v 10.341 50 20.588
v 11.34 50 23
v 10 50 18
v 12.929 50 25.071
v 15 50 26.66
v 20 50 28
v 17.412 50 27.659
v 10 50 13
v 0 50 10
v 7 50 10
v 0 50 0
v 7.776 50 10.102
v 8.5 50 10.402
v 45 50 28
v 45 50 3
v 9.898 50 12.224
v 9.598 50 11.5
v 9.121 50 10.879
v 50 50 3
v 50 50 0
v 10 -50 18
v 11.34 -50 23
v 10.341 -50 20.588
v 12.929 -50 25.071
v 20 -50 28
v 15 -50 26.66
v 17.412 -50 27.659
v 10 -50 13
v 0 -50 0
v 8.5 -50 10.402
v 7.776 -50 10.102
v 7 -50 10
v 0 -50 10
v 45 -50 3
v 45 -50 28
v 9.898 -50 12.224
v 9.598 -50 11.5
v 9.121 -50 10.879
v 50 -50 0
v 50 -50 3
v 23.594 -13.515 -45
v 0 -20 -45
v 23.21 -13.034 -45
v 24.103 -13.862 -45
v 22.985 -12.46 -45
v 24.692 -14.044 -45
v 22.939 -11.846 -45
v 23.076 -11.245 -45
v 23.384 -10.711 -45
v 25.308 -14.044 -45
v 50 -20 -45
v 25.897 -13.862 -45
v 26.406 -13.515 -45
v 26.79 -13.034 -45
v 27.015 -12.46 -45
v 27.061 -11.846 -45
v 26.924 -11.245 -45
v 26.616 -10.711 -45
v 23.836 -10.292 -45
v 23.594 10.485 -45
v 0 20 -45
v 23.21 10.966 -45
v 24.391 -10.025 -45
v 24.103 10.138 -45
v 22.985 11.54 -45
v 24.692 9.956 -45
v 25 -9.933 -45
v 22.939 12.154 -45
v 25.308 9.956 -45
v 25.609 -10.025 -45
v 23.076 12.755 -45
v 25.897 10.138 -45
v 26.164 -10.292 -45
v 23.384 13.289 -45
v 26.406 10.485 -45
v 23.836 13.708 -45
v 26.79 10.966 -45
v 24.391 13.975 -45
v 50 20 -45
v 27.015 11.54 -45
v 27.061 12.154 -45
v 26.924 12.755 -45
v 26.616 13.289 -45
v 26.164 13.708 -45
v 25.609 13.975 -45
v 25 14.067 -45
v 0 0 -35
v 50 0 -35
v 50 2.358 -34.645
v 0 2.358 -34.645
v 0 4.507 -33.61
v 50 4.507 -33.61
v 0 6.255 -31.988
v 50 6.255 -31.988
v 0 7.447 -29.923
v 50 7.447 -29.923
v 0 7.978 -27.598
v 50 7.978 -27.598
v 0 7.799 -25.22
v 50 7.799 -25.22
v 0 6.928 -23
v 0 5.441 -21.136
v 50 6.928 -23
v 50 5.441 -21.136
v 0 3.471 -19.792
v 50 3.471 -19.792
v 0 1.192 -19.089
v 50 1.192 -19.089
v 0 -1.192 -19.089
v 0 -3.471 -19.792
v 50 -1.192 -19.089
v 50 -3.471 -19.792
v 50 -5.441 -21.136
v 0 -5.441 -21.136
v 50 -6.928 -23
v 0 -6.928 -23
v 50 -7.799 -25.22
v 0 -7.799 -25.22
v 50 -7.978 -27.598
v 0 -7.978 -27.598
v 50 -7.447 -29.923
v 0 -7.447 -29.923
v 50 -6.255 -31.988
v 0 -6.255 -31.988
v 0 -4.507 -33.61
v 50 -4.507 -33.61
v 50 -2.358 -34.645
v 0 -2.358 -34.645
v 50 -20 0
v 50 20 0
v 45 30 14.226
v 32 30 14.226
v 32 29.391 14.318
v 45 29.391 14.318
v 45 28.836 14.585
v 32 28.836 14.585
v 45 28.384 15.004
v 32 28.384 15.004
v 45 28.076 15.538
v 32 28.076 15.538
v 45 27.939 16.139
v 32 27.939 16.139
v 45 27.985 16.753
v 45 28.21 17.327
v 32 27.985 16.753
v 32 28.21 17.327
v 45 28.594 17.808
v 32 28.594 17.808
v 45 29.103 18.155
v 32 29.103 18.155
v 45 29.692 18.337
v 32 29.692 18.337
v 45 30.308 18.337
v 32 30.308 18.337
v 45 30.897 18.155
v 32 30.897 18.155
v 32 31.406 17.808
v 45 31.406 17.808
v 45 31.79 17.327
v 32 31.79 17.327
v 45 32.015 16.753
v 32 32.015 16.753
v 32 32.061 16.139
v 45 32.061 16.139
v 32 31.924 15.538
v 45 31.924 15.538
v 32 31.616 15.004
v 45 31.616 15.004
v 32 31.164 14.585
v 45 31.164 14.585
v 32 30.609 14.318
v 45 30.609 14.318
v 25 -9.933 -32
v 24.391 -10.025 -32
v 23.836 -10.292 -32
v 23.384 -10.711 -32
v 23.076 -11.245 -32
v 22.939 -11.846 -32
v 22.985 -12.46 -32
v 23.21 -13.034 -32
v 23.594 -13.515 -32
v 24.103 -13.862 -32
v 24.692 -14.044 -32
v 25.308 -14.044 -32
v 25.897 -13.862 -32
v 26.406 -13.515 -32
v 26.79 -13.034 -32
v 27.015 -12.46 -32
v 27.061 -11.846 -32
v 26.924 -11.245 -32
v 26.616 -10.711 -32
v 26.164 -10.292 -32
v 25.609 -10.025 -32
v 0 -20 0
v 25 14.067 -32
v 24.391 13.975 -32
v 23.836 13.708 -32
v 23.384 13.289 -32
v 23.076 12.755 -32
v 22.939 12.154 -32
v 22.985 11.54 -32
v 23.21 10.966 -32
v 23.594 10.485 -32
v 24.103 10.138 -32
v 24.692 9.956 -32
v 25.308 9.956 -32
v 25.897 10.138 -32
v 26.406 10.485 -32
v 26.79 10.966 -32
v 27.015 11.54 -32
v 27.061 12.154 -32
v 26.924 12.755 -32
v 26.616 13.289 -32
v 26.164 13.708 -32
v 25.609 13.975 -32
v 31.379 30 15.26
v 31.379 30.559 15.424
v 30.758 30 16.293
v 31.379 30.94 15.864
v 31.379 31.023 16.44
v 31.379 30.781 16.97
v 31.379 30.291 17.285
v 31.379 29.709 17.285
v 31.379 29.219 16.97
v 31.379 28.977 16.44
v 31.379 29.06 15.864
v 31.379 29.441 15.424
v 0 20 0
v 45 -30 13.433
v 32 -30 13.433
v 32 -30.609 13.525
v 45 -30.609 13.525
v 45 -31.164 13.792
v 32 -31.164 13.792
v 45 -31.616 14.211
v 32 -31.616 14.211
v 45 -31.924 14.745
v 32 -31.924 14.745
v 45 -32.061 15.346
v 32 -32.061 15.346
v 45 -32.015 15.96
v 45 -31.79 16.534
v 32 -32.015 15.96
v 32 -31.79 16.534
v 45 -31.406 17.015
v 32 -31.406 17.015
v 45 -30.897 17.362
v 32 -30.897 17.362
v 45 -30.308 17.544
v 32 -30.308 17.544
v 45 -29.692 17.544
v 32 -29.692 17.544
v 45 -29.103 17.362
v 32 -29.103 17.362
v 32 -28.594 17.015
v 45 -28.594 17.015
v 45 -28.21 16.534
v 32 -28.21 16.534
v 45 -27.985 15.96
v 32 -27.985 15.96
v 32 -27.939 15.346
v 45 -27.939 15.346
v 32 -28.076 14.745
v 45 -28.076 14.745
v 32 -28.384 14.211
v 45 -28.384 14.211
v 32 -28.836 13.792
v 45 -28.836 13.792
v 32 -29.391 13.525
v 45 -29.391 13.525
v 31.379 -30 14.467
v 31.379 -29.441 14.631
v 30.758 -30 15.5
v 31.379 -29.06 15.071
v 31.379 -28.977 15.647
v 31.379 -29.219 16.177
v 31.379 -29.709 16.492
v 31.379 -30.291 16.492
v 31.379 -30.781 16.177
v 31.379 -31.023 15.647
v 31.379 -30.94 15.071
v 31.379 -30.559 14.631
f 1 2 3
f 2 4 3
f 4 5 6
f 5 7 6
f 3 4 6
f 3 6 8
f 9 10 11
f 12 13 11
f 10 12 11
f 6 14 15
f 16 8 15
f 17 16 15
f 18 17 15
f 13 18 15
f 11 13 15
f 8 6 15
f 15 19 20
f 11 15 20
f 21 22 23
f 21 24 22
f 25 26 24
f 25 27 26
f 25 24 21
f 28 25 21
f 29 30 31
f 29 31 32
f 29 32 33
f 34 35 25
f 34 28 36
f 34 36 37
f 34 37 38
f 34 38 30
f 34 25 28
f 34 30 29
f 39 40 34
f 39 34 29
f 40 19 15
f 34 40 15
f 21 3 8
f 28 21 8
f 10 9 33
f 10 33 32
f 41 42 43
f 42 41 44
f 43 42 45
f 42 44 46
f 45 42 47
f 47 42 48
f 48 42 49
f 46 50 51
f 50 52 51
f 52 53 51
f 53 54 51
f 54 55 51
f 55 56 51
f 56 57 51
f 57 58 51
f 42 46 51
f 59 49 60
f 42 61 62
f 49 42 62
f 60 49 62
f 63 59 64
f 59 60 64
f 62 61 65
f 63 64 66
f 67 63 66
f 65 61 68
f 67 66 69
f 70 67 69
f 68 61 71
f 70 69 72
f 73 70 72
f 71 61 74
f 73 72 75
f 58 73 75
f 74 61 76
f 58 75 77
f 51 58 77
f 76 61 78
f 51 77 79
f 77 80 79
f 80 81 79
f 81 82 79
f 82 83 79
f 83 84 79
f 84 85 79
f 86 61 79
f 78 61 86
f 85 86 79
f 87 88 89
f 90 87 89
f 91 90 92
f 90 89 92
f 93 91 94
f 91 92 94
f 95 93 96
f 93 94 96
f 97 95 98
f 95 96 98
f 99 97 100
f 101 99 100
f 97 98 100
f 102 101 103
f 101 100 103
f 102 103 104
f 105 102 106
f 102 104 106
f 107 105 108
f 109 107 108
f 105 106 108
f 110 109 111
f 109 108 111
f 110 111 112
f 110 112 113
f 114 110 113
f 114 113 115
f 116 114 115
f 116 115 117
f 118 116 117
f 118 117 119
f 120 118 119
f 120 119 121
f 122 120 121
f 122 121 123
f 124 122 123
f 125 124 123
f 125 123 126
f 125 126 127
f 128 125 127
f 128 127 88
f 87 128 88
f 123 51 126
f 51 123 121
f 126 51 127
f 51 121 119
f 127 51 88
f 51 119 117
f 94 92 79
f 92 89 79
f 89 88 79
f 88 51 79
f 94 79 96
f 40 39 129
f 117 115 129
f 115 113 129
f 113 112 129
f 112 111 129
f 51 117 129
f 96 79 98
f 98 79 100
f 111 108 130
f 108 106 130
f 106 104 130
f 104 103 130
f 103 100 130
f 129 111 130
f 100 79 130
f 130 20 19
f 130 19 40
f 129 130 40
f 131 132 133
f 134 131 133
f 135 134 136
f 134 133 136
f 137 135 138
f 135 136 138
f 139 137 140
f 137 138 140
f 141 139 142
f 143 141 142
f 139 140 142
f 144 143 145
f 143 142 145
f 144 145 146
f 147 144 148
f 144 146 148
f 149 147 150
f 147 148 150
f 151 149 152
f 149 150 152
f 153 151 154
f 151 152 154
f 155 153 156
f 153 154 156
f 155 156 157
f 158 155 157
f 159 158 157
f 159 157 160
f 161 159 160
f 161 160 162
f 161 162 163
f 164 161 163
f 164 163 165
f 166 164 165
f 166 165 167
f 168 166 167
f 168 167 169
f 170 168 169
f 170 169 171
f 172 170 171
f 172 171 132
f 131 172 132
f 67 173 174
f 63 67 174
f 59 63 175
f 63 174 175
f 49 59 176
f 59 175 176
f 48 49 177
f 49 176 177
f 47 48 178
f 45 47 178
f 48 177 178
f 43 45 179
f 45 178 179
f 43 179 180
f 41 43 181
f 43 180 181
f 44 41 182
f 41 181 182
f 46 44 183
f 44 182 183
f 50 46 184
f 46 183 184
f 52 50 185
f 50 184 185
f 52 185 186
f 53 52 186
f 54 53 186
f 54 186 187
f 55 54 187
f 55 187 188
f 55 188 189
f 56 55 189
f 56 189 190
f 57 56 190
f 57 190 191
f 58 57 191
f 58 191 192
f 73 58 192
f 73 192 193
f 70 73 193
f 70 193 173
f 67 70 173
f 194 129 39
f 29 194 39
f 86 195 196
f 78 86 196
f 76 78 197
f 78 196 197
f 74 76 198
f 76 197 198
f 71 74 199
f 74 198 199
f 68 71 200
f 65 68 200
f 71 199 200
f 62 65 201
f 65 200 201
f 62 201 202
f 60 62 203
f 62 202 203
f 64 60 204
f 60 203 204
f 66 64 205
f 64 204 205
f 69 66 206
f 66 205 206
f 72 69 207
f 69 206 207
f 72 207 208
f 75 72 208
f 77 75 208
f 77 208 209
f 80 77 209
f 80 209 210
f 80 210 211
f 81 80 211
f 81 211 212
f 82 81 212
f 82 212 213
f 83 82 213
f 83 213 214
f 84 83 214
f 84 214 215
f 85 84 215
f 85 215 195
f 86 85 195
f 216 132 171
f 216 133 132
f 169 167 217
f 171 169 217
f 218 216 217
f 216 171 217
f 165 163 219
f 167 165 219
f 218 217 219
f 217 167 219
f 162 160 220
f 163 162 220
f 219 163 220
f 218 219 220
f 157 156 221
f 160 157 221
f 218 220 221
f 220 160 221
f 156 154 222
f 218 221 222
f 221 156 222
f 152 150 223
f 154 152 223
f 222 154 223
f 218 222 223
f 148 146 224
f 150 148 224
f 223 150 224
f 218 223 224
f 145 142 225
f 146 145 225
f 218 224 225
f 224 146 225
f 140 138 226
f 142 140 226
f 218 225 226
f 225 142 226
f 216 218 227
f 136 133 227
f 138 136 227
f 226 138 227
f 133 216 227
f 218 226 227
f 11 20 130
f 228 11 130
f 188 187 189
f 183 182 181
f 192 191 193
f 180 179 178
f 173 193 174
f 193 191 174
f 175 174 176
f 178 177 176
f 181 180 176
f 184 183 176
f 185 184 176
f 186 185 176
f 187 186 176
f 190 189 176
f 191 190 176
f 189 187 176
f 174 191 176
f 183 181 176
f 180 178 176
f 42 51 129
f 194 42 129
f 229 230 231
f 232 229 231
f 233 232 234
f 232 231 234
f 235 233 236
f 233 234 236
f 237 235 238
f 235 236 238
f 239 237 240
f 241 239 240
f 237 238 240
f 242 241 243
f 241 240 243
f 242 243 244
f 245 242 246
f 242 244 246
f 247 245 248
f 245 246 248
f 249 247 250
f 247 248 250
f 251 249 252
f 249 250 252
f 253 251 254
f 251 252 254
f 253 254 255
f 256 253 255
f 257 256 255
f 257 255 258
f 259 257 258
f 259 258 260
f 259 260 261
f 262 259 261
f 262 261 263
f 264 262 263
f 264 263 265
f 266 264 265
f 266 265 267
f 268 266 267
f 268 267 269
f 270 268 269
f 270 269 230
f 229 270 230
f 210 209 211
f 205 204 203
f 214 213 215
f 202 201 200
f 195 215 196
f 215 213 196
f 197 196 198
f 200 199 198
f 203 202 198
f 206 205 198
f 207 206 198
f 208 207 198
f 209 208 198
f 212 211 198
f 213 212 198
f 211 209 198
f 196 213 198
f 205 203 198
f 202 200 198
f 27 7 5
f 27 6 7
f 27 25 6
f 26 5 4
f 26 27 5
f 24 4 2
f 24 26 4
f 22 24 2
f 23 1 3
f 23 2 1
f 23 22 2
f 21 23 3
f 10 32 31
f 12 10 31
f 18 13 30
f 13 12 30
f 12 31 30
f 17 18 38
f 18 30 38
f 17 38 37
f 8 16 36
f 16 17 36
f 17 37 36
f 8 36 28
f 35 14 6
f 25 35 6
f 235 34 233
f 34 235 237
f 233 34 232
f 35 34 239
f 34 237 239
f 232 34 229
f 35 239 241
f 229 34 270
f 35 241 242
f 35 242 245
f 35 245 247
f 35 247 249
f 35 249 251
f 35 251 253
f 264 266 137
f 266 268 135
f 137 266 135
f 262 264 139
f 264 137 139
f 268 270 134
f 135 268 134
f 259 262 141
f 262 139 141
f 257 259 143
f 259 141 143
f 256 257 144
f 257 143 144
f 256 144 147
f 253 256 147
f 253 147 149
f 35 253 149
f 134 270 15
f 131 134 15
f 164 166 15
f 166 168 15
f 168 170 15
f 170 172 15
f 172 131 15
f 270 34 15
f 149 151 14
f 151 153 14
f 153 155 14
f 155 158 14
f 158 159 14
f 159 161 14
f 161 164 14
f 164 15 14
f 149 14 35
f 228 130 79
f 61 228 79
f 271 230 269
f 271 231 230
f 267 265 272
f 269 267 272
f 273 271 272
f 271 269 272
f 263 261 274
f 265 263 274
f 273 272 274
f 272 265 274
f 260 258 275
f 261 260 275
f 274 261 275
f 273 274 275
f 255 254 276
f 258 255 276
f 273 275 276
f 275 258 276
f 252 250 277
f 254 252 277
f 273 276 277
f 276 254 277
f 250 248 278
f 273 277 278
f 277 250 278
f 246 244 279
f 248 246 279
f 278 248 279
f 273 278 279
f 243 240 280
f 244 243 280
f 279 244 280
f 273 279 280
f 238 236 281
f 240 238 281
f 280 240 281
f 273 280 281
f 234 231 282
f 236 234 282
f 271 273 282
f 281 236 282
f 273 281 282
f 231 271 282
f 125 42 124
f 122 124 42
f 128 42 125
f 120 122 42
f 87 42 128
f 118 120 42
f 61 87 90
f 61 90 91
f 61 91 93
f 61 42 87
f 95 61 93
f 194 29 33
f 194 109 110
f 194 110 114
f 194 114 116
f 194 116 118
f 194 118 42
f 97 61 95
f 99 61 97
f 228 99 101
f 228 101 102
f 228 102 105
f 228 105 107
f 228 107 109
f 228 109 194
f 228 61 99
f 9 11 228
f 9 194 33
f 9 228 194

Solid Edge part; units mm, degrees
sketch "Sketch1" plane through (0, 0, 0) normal (0, -1, 0) x (1, 0, 0)
  line L0 (45, 28) -> (10, 28)
  line L1 (10, 28) -> (10, 10)
  line L2 (0, 10) -> (10, 10)
  line L3 (0, 0) -> (0, 10)
  line L4 (0, 0) -> (0, -45)
  line L5 (0, -45) -> (50, -45)
  line L6 (50, -45) -> (50, 0)
  line L7 (50, 0) -> (50, 3)
  line L8 (50, 3) -> (45, 3)
  line L9 (45, 3) -> (45, 28)
extrude "Protrusion1" add sketch "Sketch1" along normal mid plane 100
hole "Hole_1" at (50, 0, -27) direction (-1, 0, 0) diameter 16 end through all
sketch "Sketch2" plane through (50, 0, -21) normal (1, 0, 0) x (0, 1, 0)
  line L0 (-20, -24) -> (-20, 21)
  line L1 (-20, 21) -> (-50, 21)
  line L2 (-50, 21) -> (-50, -24)
  line L3 (-50, -24) -> (-20, -24)
  line L4 (20, 21) -> (20, -24)
  line L5 (20, -24) -> (50, -24)
  line L6 (50, -24) -> (50, 21)
  line L7 (50, 21) -> (20, 21)
extrude "Cutout1" cut sketch "Sketch2" against normal through all
fillet "Round_1" radius 3 1 edges at (10, 0, 10)
fillet "Round_2" radius 10 1 edges at (10, 0, 28)
hole "Hole_2" at (45, -30, 15.5) direction (-1, 0, 0) diameter 4.134 depth 13 tip angle 118 thread major 5 thread length 10
hole "Hole1" at (45, 30, 16.2931) direction (-1, 0, 0) diameter 4.134 depth 13 tip angle 118 thread major 5 thread length 10
hole "Hole_4" at (25, 12, -45) direction (0, 0, 1) diameter 4.134 depth 13 thread major 5 thread length 10
hole "Hole2" at (25, -12, -45) direction (0, 0, 1) diameter 4.134 depth 13 thread major 5 thread length 10
